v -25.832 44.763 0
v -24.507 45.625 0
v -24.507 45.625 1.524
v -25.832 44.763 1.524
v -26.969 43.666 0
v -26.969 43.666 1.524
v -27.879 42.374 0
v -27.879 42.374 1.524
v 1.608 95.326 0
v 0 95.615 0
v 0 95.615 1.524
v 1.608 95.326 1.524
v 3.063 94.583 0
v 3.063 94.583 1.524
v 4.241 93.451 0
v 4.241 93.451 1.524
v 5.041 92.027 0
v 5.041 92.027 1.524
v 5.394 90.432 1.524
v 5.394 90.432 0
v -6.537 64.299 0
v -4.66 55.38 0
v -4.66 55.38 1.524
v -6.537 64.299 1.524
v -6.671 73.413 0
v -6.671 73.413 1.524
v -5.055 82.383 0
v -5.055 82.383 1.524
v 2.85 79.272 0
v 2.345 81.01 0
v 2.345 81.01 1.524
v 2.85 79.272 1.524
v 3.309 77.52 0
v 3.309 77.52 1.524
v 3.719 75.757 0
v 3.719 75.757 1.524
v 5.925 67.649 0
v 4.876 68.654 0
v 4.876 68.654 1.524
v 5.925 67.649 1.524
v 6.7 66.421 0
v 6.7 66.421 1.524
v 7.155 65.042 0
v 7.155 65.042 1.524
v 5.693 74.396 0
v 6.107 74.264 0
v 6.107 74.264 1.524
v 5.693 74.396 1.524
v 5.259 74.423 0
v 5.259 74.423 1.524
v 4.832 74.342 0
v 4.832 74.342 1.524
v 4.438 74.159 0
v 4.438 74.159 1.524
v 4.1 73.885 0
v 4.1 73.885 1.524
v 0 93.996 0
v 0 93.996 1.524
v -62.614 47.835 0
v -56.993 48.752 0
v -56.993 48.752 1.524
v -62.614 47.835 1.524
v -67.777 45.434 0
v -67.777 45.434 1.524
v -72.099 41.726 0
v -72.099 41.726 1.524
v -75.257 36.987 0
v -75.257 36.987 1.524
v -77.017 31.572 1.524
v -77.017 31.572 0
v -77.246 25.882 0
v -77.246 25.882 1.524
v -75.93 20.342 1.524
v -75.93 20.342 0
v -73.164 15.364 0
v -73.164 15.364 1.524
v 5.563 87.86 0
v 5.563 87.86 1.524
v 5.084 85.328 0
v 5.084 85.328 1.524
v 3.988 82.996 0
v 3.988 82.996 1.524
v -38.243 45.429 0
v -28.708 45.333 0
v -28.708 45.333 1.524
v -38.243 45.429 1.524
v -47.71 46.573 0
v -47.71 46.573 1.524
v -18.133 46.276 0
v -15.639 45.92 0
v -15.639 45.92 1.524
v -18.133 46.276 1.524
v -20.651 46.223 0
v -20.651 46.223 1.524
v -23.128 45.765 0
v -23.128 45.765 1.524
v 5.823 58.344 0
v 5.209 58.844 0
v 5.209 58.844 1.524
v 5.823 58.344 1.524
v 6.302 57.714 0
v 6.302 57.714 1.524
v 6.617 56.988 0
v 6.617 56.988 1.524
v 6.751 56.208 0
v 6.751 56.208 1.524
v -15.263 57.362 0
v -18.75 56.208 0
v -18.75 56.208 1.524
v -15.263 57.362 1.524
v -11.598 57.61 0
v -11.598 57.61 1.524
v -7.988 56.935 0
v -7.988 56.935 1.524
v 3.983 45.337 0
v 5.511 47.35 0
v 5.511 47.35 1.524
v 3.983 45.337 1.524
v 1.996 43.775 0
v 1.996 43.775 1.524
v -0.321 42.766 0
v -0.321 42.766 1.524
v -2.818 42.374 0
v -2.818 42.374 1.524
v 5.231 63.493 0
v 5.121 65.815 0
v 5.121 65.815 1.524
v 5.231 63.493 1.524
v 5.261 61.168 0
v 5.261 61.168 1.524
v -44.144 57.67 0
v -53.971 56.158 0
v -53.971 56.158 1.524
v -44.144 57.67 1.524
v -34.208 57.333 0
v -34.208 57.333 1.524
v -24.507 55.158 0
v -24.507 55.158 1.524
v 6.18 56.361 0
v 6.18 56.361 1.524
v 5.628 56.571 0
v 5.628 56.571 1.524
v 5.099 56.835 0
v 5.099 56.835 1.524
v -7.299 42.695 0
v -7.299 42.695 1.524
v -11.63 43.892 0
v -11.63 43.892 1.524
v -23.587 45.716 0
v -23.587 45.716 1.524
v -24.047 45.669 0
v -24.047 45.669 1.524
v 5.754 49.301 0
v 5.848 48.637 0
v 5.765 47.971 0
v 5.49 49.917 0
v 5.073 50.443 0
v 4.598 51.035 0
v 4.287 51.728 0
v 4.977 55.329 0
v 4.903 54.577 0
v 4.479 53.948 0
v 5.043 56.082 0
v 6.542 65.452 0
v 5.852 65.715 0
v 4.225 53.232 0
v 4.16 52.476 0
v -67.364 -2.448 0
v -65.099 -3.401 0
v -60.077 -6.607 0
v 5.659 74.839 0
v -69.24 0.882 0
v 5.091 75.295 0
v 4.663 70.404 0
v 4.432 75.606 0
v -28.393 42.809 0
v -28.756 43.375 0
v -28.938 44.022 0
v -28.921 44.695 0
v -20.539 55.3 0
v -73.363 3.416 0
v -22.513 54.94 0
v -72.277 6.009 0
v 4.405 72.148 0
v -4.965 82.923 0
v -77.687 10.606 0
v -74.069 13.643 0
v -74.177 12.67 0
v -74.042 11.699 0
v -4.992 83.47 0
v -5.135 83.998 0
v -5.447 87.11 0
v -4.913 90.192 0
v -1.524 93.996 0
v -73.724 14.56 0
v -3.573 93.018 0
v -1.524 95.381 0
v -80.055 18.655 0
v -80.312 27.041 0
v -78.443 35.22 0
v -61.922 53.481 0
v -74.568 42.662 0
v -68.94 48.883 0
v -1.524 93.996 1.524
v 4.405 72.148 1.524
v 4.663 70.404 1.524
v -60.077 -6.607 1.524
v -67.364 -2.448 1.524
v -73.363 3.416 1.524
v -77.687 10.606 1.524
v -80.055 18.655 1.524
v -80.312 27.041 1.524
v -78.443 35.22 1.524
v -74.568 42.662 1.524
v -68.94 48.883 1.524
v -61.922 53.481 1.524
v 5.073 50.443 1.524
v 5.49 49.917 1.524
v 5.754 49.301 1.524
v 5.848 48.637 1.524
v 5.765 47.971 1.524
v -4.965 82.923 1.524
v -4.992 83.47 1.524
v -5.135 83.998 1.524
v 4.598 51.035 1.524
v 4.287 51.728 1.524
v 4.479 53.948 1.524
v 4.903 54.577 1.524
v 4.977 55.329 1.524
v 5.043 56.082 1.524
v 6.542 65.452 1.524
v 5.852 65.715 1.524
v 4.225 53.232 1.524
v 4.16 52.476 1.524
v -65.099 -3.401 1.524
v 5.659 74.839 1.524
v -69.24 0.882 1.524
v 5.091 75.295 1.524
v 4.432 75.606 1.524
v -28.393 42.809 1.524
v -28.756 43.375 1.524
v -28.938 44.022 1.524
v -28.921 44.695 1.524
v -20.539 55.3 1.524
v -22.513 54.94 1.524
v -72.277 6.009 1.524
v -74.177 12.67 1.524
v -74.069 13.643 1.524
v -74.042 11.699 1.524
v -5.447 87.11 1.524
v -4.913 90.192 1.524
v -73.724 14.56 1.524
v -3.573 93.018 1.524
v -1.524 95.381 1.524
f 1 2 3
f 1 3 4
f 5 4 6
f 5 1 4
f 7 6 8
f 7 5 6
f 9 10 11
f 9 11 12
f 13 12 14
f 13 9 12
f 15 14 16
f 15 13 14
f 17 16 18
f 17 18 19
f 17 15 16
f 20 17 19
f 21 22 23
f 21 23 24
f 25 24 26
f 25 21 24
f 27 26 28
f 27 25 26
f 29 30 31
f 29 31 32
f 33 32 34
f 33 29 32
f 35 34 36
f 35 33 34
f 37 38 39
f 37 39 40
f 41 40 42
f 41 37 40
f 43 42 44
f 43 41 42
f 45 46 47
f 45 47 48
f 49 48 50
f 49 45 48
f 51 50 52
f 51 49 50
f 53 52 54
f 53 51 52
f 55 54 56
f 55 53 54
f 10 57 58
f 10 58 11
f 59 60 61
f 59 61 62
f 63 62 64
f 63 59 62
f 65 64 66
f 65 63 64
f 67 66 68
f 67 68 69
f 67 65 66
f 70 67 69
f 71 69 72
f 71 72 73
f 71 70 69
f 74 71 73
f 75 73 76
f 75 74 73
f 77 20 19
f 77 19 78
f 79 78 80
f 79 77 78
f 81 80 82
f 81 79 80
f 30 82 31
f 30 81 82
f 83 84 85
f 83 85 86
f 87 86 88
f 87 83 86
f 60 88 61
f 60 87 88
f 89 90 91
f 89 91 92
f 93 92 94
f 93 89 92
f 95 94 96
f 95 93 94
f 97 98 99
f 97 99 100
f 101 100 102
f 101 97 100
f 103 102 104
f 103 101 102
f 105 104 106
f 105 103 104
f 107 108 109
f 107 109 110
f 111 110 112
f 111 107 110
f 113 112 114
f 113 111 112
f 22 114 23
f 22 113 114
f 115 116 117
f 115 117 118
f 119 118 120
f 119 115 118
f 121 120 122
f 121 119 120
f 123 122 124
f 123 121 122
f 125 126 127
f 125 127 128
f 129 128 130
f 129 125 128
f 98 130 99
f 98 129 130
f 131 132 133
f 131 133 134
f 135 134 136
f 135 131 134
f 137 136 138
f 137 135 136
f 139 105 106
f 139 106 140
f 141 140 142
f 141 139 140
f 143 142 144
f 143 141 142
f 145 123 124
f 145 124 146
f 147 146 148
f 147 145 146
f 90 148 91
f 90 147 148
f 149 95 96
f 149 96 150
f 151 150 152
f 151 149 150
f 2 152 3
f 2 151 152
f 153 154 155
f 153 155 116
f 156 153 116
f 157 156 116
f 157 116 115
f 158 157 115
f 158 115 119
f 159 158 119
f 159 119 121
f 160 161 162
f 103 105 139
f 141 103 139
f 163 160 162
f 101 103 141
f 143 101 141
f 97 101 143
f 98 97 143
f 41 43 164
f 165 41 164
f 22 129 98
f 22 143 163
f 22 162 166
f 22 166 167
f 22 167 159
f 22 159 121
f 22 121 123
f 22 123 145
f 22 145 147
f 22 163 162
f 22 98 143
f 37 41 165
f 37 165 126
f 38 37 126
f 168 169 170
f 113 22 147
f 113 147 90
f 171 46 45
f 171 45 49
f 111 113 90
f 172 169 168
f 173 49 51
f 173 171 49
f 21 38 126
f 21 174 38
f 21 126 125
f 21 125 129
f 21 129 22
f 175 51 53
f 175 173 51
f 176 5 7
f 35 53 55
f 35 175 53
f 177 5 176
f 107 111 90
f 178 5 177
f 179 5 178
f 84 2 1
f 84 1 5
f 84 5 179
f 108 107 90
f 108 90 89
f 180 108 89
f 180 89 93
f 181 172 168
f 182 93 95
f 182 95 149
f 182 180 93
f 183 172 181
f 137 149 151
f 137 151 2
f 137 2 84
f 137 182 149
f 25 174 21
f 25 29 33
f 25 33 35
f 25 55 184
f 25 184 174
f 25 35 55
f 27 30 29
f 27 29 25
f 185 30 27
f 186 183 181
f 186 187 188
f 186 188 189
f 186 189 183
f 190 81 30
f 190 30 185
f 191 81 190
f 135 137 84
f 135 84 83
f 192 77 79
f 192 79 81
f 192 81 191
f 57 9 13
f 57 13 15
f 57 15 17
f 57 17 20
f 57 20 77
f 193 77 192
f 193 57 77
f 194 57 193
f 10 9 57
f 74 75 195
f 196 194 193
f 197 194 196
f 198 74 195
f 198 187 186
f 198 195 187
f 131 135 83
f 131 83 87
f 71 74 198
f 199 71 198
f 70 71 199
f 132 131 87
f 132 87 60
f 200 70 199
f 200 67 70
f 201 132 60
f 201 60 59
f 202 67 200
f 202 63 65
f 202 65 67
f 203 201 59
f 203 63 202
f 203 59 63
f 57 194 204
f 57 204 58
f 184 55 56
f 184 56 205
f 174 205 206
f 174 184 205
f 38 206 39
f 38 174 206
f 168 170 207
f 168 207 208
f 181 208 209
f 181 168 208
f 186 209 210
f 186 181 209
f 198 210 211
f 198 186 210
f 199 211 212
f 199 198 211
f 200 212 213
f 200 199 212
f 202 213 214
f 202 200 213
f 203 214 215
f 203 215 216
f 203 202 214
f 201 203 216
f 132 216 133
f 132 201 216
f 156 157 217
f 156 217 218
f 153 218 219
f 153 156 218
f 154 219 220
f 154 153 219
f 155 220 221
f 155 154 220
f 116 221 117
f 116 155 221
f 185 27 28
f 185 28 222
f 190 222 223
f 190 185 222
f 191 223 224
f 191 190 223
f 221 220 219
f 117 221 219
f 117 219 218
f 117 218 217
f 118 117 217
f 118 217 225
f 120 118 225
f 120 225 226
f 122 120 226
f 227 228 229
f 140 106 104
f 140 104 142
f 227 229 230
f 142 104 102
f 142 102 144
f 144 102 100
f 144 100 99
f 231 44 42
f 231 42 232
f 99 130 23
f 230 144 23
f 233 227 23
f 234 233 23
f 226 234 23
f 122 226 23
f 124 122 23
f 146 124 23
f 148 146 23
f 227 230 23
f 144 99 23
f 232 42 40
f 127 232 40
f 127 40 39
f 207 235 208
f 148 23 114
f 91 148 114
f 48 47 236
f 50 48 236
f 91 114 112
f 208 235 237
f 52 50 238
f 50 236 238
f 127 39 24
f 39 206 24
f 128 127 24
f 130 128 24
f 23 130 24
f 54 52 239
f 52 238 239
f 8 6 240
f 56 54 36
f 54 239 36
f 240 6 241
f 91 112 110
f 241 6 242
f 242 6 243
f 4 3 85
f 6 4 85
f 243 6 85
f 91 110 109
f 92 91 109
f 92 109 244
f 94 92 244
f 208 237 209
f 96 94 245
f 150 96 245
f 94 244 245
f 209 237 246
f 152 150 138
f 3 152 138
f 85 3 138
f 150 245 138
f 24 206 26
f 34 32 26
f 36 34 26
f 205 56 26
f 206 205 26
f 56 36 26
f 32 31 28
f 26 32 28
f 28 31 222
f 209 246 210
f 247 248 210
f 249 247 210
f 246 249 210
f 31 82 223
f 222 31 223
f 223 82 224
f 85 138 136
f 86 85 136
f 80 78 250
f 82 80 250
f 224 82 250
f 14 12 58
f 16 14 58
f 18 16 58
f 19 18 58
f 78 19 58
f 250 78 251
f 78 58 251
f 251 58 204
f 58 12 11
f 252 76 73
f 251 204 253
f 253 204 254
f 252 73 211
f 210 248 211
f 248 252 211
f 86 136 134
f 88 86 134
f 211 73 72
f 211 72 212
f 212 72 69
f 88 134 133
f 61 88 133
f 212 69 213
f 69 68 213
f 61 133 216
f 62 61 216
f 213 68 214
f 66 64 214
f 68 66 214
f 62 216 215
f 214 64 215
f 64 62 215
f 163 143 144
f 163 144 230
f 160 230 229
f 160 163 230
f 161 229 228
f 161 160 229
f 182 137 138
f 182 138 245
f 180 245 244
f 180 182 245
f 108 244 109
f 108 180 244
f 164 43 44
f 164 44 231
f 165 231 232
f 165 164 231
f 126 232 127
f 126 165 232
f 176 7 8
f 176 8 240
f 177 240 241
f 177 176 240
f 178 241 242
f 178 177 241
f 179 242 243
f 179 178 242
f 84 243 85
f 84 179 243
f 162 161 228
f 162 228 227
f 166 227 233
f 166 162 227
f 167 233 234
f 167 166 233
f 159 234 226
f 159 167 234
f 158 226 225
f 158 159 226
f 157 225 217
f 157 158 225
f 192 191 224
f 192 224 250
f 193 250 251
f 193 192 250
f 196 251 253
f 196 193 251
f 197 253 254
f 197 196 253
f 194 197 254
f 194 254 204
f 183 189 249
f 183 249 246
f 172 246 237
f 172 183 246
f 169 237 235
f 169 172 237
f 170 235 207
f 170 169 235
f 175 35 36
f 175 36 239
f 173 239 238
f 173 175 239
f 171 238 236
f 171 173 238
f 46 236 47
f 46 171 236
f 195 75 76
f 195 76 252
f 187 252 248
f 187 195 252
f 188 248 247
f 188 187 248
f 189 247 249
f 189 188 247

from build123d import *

# Parameters (mm, degrees)
BOSS_EXTRUDE1_DEPTH = 1.524


with BuildPart() as part:
    # Sketch1 → Boss-Extrude1 (new body)
    with BuildSketch(Plane.XY):
        with BuildLine():
            Line((-1.524, 93.996264428), (0, 93.996264428))
            Line((0, 93.996264428), (0, 95.614927588))
            ThreePointArc((0, 95.614927588), (3.693748092, 94.060684173), (5.394313408, 90.431975702))
            ThreePointArc((5.394313408, 90.431975702), (5.083870366, 85.328096728), (2.344513216, 81.010472628))
            ThreePointArc((2.344513216, 81.010472628), (3.08526248, 78.397508533), (3.719210033, 75.756599345))
            ThreePointArc((3.719210033, 75.756599345), (5.090797567, 75.29470873), (6.107013429, 74.264223104))
            ThreePointArc((6.107013429, 74.264223104), (5.043110614, 74.395683401), (4.100454534, 73.885222311))
            ThreePointArc((4.100454534, 73.885222311), (4.539807281, 71.277090284), (4.875594315, 68.653613474))
            ThreePointArc((4.875594315, 68.653613474), (6.349854496, 67.059002397), (7.15480331, 65.042003395))
            ThreePointArc((7.15480331, 65.042003395), (6.204169614, 65.603166167), (5.120829927, 65.815258603))
            ThreePointArc((5.120829927, 65.815258603), (5.25598444, 62.33072683), (5.209157654, 58.843889342))
            ThreePointArc((5.209157654, 58.843889342), (6.301599024, 57.713807832), (6.751402544, 56.207756982))
            ThreePointArc((6.751402544, 56.207756982), (5.901509406, 56.458638265), (5.099422344, 56.835355808))
            ThreePointArc((5.099422344, 56.835355808), (5.010976532, 55.705411647), (4.903376867, 54.577130307))
            ThreePointArc((4.903376867, 54.577130307), (4.160208316, 52.476052404), (5.072854771, 50.442851897))
            ThreePointArc((5.072854771, 50.442851897), (5.82334848, 48.971843275), (5.510783631, 47.350297597))
            ThreePointArc((5.510783631, 47.350297597), (1.996073925, 43.775155466), (-2.817678827, 42.374223627))
            ThreePointArc((-2.817678827, 42.374223627), (-9.49417325, 43.186036631), (-15.638900273, 45.92043747))
            ThreePointArc((-15.638900273, 45.92043747), (-19.39296862, 46.30049438), (-23.12808354, 45.765341186))
            ThreePointArc((-23.12808354, 45.765341186), (-23.817150151, 45.692245813), (-24.506779764, 45.624668263))
            ThreePointArc((-24.506779764, 45.624668263), (-26.42654707, 44.241801226), (-27.879124662, 42.374223627))
            ThreePointArc((-27.879124662, 42.374223627), (-28.871257944, 43.69170684), (-28.707753031, 45.332851748))
            ThreePointArc((-28.707753031, 45.332851748), (-42.992230857, 45.870590172), (-56.993482586, 48.751635021))
            ThreePointArc((-56.993482586, 48.751635021), (-75.256918565, 36.987495898), (-73.1639091, 15.364189619))
            ThreePointArc((-73.1639091, 15.364189619), (-74.068740922, 13.643348437), (-74.042155454, 11.699304143))
            ThreePointArc((-74.042155454, 11.699304143), (-69.240477752, 0.882449229), (-60.077247453, -6.607255003))
            ThreePointArc((-60.077247453, -6.607255003), (-80.312075554, 27.040950348), (-53.970648666, 56.157598868))
            ThreePointArc((-53.970648666, 56.157598868), (-39.168269925, 57.733871806), (-24.506779764, 55.157875102))
            ThreePointArc((-24.506779764, 55.157875102), (-21.512905256, 55.048508832), (-18.750408328, 56.207756982))
            ThreePointArc((-18.750408328, 56.207756982), (-11.598379652, 57.610020261), (-4.659613728, 55.380360214))
            ThreePointArc((-4.659613728, 55.380360214), (-6.824036174, 68.85301684), (-5.055416365, 82.38332301))
            ThreePointArc((-5.055416365, 82.38332301), (-4.963334277, 83.197390982), (-5.135176923, 83.998425237))
            ThreePointArc((-5.135176923, 83.998425237), (-4.912918532, 90.191927066), (-1.524, 95.380770374))
            Line((-1.524, 95.380770374), (-1.524, 93.996264428))
        make_face()
    extrude(amount=BOSS_EXTRUDE1_DEPTH)


solid = part.part
